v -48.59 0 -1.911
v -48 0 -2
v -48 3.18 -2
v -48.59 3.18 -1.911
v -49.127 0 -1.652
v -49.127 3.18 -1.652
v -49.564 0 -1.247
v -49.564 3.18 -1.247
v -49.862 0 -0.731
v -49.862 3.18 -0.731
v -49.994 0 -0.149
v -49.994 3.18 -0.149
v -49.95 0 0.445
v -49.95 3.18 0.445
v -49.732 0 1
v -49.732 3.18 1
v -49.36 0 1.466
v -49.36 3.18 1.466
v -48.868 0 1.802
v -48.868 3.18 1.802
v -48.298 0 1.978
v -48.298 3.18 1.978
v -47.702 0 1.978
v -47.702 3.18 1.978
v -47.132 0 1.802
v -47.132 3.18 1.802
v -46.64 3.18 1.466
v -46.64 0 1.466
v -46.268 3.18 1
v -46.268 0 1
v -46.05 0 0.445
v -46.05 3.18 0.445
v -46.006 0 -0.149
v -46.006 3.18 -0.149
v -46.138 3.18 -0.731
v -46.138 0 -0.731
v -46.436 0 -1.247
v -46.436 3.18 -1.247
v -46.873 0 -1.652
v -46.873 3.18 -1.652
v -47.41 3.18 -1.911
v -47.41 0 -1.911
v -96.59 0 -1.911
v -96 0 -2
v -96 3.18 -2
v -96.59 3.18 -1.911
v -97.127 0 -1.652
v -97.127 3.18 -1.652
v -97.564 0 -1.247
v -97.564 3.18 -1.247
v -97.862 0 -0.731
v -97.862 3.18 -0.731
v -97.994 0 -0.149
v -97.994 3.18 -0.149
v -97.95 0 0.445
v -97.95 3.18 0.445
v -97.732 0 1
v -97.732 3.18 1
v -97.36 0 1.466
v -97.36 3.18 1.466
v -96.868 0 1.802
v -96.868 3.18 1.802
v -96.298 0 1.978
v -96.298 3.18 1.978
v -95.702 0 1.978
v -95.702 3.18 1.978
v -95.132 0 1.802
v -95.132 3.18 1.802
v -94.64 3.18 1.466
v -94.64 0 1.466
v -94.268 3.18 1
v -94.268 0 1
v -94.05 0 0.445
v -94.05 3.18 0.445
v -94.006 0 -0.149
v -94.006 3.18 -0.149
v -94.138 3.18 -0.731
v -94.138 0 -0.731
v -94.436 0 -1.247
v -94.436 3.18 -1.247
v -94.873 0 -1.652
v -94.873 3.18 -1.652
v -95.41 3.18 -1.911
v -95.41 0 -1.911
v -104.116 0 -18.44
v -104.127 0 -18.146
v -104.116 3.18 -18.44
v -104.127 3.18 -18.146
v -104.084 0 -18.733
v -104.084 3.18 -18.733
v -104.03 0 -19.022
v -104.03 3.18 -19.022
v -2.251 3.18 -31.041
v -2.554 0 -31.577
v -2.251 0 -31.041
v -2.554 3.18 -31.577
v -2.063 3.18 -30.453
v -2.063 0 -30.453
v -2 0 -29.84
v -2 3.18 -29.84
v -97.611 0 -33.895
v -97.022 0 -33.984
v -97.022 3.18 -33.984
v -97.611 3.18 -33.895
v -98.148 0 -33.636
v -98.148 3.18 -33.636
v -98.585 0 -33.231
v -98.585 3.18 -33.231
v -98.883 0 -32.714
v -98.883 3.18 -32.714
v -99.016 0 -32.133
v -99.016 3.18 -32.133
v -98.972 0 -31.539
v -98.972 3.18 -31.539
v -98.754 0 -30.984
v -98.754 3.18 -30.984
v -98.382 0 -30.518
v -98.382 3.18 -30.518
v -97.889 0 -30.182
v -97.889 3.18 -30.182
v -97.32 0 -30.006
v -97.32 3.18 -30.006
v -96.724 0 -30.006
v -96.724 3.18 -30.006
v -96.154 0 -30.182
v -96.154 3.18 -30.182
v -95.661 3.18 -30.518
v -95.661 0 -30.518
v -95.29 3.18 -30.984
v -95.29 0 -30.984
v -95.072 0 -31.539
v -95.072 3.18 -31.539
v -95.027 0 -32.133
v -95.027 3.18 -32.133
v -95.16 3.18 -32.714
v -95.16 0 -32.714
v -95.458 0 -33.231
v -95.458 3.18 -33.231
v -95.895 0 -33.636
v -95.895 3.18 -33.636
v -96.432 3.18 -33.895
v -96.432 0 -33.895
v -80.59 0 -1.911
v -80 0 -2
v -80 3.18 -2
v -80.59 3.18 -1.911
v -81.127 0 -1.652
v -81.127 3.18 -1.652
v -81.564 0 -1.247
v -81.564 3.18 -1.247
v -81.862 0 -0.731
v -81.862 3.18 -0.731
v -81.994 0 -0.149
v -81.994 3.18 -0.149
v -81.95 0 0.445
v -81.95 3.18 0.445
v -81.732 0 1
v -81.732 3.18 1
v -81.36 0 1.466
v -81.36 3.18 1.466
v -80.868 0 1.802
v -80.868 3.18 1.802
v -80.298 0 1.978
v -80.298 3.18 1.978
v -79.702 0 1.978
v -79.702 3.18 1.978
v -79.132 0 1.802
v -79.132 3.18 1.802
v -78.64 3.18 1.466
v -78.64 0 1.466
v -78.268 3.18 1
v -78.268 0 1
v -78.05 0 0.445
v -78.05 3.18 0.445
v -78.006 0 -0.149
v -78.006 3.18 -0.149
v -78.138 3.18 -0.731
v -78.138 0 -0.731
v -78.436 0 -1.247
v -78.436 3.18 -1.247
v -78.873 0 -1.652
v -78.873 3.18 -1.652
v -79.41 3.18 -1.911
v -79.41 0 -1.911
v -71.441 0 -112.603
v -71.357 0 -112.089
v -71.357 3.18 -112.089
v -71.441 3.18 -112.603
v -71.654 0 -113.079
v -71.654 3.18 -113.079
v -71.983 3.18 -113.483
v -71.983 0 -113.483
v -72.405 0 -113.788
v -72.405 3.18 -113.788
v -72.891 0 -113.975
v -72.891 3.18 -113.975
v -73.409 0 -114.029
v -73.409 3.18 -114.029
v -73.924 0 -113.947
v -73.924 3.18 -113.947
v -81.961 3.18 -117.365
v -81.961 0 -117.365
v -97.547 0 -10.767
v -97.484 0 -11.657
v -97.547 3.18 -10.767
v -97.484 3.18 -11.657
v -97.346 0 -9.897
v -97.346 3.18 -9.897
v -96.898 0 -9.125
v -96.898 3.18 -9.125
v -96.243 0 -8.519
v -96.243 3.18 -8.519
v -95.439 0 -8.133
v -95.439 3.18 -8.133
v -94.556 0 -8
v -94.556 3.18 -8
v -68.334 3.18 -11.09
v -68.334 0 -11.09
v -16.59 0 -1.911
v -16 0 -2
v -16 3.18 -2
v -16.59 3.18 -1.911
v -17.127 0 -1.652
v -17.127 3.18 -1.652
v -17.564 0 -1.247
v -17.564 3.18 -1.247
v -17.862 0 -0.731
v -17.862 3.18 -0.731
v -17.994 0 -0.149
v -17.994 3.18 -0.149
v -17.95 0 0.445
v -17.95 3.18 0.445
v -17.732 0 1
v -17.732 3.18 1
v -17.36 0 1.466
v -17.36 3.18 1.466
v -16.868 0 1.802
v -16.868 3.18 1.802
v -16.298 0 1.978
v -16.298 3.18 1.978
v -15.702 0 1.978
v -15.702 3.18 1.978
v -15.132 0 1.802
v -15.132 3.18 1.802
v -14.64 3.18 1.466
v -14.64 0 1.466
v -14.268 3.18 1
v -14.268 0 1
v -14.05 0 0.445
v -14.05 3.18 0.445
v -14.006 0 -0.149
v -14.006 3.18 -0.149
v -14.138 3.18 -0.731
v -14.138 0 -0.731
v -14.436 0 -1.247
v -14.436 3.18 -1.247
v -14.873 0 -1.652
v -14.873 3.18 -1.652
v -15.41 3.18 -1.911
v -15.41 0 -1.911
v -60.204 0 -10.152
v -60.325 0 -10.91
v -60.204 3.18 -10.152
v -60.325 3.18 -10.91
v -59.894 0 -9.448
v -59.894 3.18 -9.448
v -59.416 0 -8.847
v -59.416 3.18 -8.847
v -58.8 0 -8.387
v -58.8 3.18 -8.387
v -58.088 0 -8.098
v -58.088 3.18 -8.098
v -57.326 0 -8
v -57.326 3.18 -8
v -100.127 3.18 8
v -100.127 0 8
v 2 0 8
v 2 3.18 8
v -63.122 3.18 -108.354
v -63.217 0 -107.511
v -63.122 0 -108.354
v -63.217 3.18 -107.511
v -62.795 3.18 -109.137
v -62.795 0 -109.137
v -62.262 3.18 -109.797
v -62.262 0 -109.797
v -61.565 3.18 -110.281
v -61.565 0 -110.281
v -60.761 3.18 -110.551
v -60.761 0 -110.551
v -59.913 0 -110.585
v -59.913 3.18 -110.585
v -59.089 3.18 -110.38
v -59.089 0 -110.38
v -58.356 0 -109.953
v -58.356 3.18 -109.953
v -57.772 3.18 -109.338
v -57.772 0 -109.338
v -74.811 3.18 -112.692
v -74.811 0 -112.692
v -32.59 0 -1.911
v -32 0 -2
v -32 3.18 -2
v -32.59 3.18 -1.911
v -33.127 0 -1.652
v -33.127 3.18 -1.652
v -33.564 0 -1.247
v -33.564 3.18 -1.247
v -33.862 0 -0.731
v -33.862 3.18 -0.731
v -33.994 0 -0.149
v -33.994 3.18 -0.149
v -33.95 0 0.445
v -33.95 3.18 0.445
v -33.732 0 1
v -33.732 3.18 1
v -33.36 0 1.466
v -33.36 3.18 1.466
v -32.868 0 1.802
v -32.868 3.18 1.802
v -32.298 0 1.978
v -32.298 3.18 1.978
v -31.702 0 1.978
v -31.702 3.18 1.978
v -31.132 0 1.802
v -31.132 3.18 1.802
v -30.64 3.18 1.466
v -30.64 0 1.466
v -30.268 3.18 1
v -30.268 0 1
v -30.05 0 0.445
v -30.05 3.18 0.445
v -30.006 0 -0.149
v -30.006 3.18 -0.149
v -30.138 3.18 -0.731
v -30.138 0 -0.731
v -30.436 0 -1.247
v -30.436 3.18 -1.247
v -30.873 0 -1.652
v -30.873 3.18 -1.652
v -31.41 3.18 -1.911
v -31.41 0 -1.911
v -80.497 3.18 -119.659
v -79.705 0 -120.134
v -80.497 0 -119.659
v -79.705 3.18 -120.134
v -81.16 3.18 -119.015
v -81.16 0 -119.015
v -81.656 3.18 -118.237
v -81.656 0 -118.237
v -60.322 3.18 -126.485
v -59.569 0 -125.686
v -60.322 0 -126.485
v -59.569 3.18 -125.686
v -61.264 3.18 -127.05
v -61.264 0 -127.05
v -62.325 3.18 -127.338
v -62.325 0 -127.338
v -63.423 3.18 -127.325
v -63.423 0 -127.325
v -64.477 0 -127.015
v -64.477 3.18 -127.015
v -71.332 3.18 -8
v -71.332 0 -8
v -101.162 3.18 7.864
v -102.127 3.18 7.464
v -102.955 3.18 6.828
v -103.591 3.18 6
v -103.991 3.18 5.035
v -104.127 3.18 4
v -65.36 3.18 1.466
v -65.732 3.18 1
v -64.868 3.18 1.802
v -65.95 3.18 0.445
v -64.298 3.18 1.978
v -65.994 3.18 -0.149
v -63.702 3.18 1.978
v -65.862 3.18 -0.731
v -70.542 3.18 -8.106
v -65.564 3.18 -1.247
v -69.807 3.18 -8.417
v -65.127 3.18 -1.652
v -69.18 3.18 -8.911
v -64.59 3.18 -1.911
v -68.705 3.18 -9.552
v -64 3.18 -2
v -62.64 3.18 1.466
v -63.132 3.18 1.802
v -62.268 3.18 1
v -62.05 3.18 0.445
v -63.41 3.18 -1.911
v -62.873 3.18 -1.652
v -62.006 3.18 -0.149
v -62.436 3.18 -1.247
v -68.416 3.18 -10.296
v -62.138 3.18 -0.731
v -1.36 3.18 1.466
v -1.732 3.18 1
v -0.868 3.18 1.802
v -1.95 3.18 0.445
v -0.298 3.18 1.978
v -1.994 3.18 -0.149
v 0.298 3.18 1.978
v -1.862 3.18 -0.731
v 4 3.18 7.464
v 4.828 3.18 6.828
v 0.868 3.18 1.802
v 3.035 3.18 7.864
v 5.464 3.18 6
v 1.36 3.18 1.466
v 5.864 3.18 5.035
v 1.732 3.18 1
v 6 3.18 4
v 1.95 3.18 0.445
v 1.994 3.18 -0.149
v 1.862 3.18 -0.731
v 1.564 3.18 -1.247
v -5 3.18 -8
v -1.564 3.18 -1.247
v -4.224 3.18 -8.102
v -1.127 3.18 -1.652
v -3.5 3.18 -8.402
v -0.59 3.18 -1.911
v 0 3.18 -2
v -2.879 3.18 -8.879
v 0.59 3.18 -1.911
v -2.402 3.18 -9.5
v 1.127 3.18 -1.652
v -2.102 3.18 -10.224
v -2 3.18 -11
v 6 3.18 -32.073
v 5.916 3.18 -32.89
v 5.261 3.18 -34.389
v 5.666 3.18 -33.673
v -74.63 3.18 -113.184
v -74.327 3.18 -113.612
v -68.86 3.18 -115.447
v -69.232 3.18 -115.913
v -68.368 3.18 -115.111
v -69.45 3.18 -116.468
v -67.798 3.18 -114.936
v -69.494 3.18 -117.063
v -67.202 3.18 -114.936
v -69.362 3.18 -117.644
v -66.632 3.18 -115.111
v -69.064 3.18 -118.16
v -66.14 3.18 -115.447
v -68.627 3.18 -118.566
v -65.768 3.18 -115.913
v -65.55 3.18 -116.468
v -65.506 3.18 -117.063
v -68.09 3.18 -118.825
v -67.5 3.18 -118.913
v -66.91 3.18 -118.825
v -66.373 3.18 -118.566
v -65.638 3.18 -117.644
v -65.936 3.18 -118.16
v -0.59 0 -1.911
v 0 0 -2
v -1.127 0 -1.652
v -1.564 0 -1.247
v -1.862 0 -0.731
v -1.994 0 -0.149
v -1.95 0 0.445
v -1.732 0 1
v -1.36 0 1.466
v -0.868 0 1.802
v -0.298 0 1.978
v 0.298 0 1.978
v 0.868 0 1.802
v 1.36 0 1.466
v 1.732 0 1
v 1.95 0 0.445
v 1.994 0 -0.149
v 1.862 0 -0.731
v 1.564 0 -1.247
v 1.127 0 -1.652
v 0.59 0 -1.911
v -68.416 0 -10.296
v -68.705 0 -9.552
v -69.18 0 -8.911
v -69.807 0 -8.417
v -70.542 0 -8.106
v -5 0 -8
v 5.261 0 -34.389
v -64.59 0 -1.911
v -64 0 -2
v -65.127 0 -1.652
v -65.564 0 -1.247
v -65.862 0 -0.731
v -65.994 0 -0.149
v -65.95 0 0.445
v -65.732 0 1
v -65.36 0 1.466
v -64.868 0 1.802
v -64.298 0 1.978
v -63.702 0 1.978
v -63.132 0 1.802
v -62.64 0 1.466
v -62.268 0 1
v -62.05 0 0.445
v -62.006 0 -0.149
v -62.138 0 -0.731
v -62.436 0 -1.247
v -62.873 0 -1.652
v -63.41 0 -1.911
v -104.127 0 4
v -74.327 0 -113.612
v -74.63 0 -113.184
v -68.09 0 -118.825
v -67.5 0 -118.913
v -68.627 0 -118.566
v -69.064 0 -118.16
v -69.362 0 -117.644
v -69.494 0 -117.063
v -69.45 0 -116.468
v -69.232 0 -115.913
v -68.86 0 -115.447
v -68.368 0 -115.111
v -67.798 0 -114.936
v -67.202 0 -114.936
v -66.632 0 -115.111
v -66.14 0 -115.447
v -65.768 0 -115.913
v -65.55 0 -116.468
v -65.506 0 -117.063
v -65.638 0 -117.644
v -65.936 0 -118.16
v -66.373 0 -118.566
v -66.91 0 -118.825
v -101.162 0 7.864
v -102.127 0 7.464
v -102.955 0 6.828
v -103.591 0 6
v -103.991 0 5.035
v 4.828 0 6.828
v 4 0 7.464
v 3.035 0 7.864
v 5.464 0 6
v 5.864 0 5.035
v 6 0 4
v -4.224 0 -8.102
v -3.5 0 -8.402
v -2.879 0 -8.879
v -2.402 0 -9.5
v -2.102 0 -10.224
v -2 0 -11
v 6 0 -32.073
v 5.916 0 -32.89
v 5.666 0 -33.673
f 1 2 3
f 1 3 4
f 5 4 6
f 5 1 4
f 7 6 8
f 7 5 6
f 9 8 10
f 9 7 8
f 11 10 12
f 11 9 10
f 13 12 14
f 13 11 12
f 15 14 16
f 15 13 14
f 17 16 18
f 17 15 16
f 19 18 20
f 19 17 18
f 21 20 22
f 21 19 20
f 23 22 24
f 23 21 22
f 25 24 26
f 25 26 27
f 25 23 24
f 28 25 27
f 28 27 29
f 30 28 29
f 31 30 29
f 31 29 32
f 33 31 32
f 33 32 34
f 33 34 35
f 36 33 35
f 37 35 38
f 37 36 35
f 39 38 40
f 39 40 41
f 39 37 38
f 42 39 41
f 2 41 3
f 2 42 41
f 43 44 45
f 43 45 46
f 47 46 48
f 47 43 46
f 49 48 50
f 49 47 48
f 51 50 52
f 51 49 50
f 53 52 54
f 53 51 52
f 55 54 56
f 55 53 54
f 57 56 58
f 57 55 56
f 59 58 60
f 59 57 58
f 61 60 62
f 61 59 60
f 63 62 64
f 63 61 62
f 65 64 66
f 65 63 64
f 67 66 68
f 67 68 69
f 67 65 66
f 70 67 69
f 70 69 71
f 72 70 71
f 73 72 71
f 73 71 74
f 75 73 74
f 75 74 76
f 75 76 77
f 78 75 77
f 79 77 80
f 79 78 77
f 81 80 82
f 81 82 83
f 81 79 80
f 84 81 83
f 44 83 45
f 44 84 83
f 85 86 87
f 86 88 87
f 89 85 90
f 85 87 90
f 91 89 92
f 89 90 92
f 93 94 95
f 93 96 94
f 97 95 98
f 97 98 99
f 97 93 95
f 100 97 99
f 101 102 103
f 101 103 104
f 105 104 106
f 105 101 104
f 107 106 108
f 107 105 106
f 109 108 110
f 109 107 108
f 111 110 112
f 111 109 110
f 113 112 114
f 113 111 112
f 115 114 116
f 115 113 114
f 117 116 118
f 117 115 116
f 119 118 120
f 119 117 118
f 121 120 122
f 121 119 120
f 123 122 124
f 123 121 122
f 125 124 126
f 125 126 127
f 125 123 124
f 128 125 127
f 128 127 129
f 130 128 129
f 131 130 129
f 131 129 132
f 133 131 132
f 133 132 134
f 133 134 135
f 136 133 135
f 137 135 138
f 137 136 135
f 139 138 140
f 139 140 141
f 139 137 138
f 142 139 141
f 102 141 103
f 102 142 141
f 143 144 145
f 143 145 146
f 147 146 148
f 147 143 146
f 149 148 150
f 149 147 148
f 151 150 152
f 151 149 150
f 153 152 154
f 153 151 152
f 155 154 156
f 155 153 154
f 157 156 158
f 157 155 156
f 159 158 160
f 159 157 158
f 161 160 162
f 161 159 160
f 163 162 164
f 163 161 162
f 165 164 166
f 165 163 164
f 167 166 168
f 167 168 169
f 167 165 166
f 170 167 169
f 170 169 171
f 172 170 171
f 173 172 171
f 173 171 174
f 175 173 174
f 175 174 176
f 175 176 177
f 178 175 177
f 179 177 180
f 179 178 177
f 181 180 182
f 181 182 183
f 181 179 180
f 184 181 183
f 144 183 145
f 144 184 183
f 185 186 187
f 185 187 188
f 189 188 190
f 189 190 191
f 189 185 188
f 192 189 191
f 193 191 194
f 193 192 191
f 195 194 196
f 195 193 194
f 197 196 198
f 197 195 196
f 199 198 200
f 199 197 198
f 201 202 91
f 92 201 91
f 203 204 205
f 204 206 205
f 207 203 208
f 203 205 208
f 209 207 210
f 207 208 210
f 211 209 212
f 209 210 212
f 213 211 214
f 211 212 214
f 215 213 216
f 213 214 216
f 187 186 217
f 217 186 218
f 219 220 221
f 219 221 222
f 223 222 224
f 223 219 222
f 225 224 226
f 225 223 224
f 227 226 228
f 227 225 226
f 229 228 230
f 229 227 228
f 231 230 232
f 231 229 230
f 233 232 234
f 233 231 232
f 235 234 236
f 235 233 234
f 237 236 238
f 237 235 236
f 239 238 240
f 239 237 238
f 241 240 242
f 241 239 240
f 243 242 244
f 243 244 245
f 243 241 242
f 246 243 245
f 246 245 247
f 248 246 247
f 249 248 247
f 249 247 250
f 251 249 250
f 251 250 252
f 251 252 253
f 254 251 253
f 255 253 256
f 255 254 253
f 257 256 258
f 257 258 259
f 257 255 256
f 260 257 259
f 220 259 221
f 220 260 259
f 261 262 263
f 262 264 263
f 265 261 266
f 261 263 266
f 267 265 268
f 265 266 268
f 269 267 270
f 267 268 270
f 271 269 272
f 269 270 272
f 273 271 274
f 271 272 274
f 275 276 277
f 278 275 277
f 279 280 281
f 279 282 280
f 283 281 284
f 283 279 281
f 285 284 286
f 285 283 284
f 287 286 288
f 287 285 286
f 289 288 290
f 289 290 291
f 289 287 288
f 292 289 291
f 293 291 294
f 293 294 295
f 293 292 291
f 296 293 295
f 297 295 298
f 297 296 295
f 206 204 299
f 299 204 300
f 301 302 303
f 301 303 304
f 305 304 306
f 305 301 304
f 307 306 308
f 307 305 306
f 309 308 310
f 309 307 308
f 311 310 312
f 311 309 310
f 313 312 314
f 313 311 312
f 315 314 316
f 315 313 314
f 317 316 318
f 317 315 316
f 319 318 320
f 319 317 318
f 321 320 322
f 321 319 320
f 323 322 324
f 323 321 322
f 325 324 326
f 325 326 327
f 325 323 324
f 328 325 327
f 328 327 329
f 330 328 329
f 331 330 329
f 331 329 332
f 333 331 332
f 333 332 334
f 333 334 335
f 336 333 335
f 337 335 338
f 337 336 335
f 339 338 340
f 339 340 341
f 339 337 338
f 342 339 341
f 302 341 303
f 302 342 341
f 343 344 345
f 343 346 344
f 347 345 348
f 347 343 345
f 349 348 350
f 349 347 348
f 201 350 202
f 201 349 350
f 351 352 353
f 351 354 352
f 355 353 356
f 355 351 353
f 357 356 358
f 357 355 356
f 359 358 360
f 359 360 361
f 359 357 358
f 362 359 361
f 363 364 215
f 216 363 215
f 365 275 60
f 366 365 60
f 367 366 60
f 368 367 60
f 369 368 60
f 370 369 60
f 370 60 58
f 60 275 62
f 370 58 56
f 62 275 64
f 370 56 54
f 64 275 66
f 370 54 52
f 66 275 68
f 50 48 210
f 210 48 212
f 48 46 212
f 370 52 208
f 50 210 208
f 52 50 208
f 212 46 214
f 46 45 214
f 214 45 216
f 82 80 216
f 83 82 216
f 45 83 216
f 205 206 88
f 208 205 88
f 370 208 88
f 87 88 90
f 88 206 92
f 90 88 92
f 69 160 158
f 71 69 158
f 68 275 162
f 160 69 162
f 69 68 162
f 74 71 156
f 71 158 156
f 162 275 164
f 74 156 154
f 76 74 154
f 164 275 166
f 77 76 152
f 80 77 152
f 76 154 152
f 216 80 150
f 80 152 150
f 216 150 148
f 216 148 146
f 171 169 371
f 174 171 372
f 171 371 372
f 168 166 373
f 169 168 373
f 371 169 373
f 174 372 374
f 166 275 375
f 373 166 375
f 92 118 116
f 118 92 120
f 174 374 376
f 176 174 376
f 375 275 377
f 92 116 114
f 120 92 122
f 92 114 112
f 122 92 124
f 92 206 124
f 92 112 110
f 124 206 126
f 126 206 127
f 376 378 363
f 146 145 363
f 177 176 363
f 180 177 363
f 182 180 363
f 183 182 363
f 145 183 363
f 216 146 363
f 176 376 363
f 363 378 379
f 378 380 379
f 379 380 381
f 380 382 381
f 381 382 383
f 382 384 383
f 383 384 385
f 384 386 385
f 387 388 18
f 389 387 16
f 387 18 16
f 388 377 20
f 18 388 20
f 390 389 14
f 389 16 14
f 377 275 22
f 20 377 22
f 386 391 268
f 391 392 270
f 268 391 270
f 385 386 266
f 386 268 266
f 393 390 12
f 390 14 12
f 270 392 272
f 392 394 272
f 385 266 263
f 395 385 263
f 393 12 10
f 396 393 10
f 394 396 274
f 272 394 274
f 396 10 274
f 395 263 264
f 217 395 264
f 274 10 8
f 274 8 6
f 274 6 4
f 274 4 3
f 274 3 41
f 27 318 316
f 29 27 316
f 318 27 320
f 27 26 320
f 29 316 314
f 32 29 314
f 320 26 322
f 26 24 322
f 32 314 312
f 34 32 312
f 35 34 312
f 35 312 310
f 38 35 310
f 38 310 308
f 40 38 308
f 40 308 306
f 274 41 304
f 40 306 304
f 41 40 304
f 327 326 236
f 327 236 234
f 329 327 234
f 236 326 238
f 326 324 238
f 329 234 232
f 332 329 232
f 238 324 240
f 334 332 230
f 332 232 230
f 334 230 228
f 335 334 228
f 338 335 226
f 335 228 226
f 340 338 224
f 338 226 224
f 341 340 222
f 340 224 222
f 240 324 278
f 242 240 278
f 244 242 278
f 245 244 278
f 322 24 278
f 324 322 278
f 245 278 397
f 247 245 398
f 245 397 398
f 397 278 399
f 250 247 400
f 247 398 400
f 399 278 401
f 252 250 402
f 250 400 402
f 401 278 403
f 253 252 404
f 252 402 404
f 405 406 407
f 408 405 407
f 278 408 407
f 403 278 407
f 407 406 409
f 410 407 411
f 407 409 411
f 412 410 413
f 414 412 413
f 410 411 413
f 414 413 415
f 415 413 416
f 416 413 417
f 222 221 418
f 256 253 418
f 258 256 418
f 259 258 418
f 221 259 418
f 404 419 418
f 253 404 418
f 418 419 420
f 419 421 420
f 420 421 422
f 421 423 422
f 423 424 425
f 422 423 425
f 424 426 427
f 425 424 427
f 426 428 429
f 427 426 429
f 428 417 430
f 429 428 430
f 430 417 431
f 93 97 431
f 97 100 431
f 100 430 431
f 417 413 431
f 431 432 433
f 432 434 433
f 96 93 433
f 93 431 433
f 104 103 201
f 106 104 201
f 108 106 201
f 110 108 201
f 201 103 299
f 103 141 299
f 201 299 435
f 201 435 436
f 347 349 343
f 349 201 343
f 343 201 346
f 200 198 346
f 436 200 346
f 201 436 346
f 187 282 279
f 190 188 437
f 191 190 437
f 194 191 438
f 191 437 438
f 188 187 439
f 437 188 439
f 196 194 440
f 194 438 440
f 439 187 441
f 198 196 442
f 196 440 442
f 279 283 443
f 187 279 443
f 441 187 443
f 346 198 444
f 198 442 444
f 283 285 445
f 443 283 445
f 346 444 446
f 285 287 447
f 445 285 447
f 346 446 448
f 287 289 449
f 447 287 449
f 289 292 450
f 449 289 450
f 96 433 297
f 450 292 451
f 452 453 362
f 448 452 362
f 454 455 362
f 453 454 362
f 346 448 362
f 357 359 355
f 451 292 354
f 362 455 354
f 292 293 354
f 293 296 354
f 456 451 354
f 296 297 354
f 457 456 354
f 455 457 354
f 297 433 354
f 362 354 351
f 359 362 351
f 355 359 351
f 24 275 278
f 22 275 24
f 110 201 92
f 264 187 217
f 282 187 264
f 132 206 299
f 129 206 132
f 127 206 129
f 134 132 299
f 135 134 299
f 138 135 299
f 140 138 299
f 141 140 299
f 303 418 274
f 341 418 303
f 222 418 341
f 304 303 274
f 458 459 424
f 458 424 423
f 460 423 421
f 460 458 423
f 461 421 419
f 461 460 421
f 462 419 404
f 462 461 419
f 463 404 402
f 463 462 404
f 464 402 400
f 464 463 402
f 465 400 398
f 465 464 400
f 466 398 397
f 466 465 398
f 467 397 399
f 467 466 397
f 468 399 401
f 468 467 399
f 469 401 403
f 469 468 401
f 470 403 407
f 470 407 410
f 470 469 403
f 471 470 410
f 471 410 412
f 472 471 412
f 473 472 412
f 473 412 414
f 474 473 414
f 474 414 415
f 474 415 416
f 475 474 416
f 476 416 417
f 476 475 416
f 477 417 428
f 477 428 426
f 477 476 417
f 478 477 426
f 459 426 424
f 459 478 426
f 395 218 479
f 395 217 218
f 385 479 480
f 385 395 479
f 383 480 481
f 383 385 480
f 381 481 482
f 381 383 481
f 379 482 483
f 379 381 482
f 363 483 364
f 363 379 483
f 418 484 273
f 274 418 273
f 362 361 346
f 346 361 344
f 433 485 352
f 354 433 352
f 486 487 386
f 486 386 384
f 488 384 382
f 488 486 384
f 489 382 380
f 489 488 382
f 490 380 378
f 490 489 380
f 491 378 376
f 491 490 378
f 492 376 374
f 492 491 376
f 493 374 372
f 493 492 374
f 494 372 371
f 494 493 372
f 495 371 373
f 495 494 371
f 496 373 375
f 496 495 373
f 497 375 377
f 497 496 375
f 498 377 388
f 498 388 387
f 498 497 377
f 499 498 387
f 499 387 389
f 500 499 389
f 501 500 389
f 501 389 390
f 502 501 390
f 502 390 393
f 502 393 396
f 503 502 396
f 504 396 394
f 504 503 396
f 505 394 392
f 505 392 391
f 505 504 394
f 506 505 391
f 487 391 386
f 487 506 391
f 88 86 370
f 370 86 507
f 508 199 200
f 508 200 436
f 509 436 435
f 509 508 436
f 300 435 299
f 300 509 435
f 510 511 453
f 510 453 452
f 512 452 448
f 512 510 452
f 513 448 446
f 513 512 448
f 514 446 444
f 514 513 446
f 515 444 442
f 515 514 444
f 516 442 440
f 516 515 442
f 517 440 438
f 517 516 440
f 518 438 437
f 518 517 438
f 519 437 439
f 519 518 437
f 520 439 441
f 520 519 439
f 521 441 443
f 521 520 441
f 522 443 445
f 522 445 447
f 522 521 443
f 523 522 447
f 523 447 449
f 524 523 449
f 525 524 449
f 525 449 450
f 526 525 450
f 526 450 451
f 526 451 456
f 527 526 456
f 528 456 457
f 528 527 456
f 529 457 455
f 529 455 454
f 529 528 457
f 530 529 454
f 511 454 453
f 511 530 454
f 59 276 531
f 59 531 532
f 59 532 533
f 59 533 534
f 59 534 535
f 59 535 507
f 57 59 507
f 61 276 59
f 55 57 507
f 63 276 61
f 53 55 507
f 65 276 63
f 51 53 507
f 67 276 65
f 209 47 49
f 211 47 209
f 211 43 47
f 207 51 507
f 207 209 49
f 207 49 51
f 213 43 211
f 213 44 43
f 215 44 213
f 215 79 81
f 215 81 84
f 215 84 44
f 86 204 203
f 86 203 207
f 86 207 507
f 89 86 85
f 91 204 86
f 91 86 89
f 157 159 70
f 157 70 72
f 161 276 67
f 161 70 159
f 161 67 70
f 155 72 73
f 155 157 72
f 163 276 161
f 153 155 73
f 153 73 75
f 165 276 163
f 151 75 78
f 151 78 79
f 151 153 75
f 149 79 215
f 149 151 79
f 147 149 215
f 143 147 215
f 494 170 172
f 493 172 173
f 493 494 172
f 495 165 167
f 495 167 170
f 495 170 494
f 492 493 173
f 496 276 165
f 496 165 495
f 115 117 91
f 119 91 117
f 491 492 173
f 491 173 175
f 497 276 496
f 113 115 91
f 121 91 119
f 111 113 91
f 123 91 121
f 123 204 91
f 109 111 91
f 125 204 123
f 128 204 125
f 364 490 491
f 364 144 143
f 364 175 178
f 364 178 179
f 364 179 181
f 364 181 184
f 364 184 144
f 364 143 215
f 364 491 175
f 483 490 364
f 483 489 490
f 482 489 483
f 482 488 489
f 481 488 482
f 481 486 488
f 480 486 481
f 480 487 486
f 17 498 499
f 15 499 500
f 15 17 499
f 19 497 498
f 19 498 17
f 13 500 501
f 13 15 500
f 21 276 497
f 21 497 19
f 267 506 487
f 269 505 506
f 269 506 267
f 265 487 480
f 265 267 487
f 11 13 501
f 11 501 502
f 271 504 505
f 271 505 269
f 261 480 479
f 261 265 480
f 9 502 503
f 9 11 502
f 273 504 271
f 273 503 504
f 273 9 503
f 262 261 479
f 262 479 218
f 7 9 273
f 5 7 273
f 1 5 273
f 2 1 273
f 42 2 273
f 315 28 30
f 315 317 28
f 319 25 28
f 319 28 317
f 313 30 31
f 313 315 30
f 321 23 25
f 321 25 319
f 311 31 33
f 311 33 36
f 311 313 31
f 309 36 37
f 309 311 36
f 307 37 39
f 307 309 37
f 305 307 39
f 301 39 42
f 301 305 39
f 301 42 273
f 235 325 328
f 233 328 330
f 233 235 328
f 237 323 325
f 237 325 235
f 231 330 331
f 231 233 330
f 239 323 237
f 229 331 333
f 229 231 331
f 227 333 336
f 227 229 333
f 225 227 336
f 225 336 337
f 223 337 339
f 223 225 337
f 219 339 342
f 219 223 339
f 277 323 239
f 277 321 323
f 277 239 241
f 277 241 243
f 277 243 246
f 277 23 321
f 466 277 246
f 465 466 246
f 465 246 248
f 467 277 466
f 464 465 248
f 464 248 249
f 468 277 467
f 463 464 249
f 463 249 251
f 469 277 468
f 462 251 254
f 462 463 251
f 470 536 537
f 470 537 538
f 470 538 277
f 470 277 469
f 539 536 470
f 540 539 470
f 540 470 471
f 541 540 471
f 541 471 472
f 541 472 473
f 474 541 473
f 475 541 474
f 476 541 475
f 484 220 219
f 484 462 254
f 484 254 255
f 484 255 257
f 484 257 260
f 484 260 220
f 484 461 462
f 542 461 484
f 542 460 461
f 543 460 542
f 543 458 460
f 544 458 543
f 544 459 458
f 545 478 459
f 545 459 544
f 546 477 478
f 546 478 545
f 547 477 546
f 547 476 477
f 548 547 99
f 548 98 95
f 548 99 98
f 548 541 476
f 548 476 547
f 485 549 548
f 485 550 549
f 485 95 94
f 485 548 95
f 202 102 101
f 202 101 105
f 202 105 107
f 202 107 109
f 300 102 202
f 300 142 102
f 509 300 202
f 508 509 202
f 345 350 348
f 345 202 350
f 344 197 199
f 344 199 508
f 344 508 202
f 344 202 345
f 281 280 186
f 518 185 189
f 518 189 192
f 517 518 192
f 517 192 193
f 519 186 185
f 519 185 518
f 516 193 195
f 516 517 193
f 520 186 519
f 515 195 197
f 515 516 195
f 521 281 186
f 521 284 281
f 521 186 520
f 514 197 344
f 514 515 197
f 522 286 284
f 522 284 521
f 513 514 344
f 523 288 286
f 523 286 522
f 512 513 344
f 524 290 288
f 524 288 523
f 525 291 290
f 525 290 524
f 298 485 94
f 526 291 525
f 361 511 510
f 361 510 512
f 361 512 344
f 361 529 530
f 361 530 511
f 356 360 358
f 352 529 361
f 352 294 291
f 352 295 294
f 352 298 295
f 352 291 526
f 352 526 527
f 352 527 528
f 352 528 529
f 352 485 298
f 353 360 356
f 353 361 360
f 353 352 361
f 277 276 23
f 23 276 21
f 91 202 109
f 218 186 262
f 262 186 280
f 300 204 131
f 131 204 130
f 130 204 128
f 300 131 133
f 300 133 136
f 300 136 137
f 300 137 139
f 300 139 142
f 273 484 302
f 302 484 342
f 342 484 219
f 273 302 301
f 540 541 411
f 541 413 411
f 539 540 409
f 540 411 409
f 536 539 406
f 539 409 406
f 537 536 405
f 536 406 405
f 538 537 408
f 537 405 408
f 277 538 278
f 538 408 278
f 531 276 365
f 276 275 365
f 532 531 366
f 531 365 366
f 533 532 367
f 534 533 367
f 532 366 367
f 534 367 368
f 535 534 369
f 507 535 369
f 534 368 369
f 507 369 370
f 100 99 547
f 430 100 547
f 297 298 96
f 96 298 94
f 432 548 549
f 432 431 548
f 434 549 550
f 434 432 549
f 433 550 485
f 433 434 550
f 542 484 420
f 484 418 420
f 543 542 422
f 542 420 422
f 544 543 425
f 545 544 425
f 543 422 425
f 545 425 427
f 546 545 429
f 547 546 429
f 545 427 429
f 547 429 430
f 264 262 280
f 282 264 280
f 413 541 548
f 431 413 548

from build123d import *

# Parameters (mm, degrees)
SKETCH1_R           = 2
BOSS_EXTRUDE1_DEPTH = 3.18
FILLET2_R           = 4
FILLET4_R           = 3
FILLET5_R           = 2


with BuildPart() as part:
    # Sketch1 → Boss-Extrude1 (new body)
    with BuildSketch(Plane(origin=(0, 0, 0), x_dir=(1, 0, 0), z_dir=(0, 1, 0))):
        Polygon((-16, -8), (6, -8), (6, 33.34843691), (-61.475760907, 128.370940703), (-81.524239093, 119.312324779), (-104.126855641, 18.58956294), (-104.126855641, -8), (-86.093666761, -8), align=None)
        with Locations(Location((-16, 0, 0), (0, 0, 90))):
            Circle(SKETCH1_R, mode=Mode.SUBTRACT)
        with Locations(Location((0, 0, 0), (0, 0, 90))):
            Circle(SKETCH1_R, mode=Mode.SUBTRACT)
        with Locations(Location((-67.5, 116.913429511, 0), (0, 0, 90))):
            Circle(SKETCH1_R, mode=Mode.SUBTRACT)
        with Locations(Location((-32, 0, 0), (0, 0, 90))):
            Circle(SKETCH1_R, mode=Mode.SUBTRACT)
        with Locations(Location((-48, 0, 0), (0, 0, 90))):
            Circle(SKETCH1_R, mode=Mode.SUBTRACT)
        with Locations(Location((-64, 0, 0), (0, 0, 90))):
            Circle(SKETCH1_R, mode=Mode.SUBTRACT)
        with Locations(Location((-80, 0, 0), (0, 0, 90))):
            Circle(SKETCH1_R, mode=Mode.SUBTRACT)
        with Locations(Location((-96, 0, 0), (0, 0, 90))):
            Circle(SKETCH1_R, mode=Mode.SUBTRACT)
        with Locations(Location((-97.021679837, 31.983686003, 0), (0, 0, 90))):
            Circle(SKETCH1_R, mode=Mode.SUBTRACT)
        Polygon((-63.513465031, 117.423073167), (-2, 30.796951643), (-2, 8), (-60.237701437, 8), align=None, mode=Mode.SUBTRACT)
        Polygon((-68.241285453, 8), (-98.304243511, 8), (-74.592422981, 113.66564481), (-71.44710907, 115.086809569), align=None, mode=Mode.SUBTRACT)
    extrude(amount=BOSS_EXTRUDE1_DEPTH)

    # Fillet2
    fillet2_edges = [part.edges().sort_by_distance(p)[0] for p in [
        (6, 1.59, 8),
        (-104.126855641, 1.59, 8),
        (-104.126855641, 1.59, -18.58956294),
        (-81.524239093, 1.59, -119.312324779),
        (-61.475760907, 1.59, -128.370940703),
        (6, 1.59, -33.34843691),
    ]]
    fillet(fillet2_edges, radius=FILLET2_R)

    # Fillet4
    fillet4_edges = [part.edges().sort_by_distance(p)[0] for p in [
        (-98.304243511, 1.59, -8),
        (-68.241285453, 1.59, -8),
        (-63.513465031, 1.59, -117.423073167),
        (-60.237701437, 1.59, -8),
        (-2, 1.59, -8),
        (-2, 1.59, -30.796951643),
    ]]
    fillet(fillet4_edges, radius=FILLET4_R)

    # Fillet5
    # the kernel refuses this fillet: 2 mm, written as the material it adds along each edge
    with BuildSketch(Plane(origin=(-71.44710907, 0, -115.086809569), x_dir=(0.02992327493551802, 0, 0.9995521985454954), z_dir=(0, 1, 0))) as fillet5_piece_1:
        with BuildLine():
            CenterArc((FILLET5_R * 1.49944843897, -FILLET5_R), FILLET5_R, 90, 112.600412538)
            Line((FILLET5_R * 0.576240988861, -FILLET5_R * 1.3843019699), (0, 0))
            Line((0, 0), (FILLET5_R * 1.49944843897, 0))
        make_face()
    extrude(amount=3.18)
    with BuildSketch(Plane(origin=(-74.592422981, 0, -113.66564481), x_dir=(-0.21895888286608584, 0, 0.9757340865287201), z_dir=(0, 1, 0))) as fillet5_piece_2:
        with BuildLine():
            CenterArc((FILLET5_R * 0.498984426224, FILLET5_R), FILLET5_R, 216.963036407, 53.036963593)
            Line((-FILLET5_R * 0.300039170379, FILLET5_R * 0.39870033089), (0, 0))
            Line((0, 0), (FILLET5_R * 0.498984426224, 0))
        make_face()
    extrude(amount=3.18)


solid = part.part
